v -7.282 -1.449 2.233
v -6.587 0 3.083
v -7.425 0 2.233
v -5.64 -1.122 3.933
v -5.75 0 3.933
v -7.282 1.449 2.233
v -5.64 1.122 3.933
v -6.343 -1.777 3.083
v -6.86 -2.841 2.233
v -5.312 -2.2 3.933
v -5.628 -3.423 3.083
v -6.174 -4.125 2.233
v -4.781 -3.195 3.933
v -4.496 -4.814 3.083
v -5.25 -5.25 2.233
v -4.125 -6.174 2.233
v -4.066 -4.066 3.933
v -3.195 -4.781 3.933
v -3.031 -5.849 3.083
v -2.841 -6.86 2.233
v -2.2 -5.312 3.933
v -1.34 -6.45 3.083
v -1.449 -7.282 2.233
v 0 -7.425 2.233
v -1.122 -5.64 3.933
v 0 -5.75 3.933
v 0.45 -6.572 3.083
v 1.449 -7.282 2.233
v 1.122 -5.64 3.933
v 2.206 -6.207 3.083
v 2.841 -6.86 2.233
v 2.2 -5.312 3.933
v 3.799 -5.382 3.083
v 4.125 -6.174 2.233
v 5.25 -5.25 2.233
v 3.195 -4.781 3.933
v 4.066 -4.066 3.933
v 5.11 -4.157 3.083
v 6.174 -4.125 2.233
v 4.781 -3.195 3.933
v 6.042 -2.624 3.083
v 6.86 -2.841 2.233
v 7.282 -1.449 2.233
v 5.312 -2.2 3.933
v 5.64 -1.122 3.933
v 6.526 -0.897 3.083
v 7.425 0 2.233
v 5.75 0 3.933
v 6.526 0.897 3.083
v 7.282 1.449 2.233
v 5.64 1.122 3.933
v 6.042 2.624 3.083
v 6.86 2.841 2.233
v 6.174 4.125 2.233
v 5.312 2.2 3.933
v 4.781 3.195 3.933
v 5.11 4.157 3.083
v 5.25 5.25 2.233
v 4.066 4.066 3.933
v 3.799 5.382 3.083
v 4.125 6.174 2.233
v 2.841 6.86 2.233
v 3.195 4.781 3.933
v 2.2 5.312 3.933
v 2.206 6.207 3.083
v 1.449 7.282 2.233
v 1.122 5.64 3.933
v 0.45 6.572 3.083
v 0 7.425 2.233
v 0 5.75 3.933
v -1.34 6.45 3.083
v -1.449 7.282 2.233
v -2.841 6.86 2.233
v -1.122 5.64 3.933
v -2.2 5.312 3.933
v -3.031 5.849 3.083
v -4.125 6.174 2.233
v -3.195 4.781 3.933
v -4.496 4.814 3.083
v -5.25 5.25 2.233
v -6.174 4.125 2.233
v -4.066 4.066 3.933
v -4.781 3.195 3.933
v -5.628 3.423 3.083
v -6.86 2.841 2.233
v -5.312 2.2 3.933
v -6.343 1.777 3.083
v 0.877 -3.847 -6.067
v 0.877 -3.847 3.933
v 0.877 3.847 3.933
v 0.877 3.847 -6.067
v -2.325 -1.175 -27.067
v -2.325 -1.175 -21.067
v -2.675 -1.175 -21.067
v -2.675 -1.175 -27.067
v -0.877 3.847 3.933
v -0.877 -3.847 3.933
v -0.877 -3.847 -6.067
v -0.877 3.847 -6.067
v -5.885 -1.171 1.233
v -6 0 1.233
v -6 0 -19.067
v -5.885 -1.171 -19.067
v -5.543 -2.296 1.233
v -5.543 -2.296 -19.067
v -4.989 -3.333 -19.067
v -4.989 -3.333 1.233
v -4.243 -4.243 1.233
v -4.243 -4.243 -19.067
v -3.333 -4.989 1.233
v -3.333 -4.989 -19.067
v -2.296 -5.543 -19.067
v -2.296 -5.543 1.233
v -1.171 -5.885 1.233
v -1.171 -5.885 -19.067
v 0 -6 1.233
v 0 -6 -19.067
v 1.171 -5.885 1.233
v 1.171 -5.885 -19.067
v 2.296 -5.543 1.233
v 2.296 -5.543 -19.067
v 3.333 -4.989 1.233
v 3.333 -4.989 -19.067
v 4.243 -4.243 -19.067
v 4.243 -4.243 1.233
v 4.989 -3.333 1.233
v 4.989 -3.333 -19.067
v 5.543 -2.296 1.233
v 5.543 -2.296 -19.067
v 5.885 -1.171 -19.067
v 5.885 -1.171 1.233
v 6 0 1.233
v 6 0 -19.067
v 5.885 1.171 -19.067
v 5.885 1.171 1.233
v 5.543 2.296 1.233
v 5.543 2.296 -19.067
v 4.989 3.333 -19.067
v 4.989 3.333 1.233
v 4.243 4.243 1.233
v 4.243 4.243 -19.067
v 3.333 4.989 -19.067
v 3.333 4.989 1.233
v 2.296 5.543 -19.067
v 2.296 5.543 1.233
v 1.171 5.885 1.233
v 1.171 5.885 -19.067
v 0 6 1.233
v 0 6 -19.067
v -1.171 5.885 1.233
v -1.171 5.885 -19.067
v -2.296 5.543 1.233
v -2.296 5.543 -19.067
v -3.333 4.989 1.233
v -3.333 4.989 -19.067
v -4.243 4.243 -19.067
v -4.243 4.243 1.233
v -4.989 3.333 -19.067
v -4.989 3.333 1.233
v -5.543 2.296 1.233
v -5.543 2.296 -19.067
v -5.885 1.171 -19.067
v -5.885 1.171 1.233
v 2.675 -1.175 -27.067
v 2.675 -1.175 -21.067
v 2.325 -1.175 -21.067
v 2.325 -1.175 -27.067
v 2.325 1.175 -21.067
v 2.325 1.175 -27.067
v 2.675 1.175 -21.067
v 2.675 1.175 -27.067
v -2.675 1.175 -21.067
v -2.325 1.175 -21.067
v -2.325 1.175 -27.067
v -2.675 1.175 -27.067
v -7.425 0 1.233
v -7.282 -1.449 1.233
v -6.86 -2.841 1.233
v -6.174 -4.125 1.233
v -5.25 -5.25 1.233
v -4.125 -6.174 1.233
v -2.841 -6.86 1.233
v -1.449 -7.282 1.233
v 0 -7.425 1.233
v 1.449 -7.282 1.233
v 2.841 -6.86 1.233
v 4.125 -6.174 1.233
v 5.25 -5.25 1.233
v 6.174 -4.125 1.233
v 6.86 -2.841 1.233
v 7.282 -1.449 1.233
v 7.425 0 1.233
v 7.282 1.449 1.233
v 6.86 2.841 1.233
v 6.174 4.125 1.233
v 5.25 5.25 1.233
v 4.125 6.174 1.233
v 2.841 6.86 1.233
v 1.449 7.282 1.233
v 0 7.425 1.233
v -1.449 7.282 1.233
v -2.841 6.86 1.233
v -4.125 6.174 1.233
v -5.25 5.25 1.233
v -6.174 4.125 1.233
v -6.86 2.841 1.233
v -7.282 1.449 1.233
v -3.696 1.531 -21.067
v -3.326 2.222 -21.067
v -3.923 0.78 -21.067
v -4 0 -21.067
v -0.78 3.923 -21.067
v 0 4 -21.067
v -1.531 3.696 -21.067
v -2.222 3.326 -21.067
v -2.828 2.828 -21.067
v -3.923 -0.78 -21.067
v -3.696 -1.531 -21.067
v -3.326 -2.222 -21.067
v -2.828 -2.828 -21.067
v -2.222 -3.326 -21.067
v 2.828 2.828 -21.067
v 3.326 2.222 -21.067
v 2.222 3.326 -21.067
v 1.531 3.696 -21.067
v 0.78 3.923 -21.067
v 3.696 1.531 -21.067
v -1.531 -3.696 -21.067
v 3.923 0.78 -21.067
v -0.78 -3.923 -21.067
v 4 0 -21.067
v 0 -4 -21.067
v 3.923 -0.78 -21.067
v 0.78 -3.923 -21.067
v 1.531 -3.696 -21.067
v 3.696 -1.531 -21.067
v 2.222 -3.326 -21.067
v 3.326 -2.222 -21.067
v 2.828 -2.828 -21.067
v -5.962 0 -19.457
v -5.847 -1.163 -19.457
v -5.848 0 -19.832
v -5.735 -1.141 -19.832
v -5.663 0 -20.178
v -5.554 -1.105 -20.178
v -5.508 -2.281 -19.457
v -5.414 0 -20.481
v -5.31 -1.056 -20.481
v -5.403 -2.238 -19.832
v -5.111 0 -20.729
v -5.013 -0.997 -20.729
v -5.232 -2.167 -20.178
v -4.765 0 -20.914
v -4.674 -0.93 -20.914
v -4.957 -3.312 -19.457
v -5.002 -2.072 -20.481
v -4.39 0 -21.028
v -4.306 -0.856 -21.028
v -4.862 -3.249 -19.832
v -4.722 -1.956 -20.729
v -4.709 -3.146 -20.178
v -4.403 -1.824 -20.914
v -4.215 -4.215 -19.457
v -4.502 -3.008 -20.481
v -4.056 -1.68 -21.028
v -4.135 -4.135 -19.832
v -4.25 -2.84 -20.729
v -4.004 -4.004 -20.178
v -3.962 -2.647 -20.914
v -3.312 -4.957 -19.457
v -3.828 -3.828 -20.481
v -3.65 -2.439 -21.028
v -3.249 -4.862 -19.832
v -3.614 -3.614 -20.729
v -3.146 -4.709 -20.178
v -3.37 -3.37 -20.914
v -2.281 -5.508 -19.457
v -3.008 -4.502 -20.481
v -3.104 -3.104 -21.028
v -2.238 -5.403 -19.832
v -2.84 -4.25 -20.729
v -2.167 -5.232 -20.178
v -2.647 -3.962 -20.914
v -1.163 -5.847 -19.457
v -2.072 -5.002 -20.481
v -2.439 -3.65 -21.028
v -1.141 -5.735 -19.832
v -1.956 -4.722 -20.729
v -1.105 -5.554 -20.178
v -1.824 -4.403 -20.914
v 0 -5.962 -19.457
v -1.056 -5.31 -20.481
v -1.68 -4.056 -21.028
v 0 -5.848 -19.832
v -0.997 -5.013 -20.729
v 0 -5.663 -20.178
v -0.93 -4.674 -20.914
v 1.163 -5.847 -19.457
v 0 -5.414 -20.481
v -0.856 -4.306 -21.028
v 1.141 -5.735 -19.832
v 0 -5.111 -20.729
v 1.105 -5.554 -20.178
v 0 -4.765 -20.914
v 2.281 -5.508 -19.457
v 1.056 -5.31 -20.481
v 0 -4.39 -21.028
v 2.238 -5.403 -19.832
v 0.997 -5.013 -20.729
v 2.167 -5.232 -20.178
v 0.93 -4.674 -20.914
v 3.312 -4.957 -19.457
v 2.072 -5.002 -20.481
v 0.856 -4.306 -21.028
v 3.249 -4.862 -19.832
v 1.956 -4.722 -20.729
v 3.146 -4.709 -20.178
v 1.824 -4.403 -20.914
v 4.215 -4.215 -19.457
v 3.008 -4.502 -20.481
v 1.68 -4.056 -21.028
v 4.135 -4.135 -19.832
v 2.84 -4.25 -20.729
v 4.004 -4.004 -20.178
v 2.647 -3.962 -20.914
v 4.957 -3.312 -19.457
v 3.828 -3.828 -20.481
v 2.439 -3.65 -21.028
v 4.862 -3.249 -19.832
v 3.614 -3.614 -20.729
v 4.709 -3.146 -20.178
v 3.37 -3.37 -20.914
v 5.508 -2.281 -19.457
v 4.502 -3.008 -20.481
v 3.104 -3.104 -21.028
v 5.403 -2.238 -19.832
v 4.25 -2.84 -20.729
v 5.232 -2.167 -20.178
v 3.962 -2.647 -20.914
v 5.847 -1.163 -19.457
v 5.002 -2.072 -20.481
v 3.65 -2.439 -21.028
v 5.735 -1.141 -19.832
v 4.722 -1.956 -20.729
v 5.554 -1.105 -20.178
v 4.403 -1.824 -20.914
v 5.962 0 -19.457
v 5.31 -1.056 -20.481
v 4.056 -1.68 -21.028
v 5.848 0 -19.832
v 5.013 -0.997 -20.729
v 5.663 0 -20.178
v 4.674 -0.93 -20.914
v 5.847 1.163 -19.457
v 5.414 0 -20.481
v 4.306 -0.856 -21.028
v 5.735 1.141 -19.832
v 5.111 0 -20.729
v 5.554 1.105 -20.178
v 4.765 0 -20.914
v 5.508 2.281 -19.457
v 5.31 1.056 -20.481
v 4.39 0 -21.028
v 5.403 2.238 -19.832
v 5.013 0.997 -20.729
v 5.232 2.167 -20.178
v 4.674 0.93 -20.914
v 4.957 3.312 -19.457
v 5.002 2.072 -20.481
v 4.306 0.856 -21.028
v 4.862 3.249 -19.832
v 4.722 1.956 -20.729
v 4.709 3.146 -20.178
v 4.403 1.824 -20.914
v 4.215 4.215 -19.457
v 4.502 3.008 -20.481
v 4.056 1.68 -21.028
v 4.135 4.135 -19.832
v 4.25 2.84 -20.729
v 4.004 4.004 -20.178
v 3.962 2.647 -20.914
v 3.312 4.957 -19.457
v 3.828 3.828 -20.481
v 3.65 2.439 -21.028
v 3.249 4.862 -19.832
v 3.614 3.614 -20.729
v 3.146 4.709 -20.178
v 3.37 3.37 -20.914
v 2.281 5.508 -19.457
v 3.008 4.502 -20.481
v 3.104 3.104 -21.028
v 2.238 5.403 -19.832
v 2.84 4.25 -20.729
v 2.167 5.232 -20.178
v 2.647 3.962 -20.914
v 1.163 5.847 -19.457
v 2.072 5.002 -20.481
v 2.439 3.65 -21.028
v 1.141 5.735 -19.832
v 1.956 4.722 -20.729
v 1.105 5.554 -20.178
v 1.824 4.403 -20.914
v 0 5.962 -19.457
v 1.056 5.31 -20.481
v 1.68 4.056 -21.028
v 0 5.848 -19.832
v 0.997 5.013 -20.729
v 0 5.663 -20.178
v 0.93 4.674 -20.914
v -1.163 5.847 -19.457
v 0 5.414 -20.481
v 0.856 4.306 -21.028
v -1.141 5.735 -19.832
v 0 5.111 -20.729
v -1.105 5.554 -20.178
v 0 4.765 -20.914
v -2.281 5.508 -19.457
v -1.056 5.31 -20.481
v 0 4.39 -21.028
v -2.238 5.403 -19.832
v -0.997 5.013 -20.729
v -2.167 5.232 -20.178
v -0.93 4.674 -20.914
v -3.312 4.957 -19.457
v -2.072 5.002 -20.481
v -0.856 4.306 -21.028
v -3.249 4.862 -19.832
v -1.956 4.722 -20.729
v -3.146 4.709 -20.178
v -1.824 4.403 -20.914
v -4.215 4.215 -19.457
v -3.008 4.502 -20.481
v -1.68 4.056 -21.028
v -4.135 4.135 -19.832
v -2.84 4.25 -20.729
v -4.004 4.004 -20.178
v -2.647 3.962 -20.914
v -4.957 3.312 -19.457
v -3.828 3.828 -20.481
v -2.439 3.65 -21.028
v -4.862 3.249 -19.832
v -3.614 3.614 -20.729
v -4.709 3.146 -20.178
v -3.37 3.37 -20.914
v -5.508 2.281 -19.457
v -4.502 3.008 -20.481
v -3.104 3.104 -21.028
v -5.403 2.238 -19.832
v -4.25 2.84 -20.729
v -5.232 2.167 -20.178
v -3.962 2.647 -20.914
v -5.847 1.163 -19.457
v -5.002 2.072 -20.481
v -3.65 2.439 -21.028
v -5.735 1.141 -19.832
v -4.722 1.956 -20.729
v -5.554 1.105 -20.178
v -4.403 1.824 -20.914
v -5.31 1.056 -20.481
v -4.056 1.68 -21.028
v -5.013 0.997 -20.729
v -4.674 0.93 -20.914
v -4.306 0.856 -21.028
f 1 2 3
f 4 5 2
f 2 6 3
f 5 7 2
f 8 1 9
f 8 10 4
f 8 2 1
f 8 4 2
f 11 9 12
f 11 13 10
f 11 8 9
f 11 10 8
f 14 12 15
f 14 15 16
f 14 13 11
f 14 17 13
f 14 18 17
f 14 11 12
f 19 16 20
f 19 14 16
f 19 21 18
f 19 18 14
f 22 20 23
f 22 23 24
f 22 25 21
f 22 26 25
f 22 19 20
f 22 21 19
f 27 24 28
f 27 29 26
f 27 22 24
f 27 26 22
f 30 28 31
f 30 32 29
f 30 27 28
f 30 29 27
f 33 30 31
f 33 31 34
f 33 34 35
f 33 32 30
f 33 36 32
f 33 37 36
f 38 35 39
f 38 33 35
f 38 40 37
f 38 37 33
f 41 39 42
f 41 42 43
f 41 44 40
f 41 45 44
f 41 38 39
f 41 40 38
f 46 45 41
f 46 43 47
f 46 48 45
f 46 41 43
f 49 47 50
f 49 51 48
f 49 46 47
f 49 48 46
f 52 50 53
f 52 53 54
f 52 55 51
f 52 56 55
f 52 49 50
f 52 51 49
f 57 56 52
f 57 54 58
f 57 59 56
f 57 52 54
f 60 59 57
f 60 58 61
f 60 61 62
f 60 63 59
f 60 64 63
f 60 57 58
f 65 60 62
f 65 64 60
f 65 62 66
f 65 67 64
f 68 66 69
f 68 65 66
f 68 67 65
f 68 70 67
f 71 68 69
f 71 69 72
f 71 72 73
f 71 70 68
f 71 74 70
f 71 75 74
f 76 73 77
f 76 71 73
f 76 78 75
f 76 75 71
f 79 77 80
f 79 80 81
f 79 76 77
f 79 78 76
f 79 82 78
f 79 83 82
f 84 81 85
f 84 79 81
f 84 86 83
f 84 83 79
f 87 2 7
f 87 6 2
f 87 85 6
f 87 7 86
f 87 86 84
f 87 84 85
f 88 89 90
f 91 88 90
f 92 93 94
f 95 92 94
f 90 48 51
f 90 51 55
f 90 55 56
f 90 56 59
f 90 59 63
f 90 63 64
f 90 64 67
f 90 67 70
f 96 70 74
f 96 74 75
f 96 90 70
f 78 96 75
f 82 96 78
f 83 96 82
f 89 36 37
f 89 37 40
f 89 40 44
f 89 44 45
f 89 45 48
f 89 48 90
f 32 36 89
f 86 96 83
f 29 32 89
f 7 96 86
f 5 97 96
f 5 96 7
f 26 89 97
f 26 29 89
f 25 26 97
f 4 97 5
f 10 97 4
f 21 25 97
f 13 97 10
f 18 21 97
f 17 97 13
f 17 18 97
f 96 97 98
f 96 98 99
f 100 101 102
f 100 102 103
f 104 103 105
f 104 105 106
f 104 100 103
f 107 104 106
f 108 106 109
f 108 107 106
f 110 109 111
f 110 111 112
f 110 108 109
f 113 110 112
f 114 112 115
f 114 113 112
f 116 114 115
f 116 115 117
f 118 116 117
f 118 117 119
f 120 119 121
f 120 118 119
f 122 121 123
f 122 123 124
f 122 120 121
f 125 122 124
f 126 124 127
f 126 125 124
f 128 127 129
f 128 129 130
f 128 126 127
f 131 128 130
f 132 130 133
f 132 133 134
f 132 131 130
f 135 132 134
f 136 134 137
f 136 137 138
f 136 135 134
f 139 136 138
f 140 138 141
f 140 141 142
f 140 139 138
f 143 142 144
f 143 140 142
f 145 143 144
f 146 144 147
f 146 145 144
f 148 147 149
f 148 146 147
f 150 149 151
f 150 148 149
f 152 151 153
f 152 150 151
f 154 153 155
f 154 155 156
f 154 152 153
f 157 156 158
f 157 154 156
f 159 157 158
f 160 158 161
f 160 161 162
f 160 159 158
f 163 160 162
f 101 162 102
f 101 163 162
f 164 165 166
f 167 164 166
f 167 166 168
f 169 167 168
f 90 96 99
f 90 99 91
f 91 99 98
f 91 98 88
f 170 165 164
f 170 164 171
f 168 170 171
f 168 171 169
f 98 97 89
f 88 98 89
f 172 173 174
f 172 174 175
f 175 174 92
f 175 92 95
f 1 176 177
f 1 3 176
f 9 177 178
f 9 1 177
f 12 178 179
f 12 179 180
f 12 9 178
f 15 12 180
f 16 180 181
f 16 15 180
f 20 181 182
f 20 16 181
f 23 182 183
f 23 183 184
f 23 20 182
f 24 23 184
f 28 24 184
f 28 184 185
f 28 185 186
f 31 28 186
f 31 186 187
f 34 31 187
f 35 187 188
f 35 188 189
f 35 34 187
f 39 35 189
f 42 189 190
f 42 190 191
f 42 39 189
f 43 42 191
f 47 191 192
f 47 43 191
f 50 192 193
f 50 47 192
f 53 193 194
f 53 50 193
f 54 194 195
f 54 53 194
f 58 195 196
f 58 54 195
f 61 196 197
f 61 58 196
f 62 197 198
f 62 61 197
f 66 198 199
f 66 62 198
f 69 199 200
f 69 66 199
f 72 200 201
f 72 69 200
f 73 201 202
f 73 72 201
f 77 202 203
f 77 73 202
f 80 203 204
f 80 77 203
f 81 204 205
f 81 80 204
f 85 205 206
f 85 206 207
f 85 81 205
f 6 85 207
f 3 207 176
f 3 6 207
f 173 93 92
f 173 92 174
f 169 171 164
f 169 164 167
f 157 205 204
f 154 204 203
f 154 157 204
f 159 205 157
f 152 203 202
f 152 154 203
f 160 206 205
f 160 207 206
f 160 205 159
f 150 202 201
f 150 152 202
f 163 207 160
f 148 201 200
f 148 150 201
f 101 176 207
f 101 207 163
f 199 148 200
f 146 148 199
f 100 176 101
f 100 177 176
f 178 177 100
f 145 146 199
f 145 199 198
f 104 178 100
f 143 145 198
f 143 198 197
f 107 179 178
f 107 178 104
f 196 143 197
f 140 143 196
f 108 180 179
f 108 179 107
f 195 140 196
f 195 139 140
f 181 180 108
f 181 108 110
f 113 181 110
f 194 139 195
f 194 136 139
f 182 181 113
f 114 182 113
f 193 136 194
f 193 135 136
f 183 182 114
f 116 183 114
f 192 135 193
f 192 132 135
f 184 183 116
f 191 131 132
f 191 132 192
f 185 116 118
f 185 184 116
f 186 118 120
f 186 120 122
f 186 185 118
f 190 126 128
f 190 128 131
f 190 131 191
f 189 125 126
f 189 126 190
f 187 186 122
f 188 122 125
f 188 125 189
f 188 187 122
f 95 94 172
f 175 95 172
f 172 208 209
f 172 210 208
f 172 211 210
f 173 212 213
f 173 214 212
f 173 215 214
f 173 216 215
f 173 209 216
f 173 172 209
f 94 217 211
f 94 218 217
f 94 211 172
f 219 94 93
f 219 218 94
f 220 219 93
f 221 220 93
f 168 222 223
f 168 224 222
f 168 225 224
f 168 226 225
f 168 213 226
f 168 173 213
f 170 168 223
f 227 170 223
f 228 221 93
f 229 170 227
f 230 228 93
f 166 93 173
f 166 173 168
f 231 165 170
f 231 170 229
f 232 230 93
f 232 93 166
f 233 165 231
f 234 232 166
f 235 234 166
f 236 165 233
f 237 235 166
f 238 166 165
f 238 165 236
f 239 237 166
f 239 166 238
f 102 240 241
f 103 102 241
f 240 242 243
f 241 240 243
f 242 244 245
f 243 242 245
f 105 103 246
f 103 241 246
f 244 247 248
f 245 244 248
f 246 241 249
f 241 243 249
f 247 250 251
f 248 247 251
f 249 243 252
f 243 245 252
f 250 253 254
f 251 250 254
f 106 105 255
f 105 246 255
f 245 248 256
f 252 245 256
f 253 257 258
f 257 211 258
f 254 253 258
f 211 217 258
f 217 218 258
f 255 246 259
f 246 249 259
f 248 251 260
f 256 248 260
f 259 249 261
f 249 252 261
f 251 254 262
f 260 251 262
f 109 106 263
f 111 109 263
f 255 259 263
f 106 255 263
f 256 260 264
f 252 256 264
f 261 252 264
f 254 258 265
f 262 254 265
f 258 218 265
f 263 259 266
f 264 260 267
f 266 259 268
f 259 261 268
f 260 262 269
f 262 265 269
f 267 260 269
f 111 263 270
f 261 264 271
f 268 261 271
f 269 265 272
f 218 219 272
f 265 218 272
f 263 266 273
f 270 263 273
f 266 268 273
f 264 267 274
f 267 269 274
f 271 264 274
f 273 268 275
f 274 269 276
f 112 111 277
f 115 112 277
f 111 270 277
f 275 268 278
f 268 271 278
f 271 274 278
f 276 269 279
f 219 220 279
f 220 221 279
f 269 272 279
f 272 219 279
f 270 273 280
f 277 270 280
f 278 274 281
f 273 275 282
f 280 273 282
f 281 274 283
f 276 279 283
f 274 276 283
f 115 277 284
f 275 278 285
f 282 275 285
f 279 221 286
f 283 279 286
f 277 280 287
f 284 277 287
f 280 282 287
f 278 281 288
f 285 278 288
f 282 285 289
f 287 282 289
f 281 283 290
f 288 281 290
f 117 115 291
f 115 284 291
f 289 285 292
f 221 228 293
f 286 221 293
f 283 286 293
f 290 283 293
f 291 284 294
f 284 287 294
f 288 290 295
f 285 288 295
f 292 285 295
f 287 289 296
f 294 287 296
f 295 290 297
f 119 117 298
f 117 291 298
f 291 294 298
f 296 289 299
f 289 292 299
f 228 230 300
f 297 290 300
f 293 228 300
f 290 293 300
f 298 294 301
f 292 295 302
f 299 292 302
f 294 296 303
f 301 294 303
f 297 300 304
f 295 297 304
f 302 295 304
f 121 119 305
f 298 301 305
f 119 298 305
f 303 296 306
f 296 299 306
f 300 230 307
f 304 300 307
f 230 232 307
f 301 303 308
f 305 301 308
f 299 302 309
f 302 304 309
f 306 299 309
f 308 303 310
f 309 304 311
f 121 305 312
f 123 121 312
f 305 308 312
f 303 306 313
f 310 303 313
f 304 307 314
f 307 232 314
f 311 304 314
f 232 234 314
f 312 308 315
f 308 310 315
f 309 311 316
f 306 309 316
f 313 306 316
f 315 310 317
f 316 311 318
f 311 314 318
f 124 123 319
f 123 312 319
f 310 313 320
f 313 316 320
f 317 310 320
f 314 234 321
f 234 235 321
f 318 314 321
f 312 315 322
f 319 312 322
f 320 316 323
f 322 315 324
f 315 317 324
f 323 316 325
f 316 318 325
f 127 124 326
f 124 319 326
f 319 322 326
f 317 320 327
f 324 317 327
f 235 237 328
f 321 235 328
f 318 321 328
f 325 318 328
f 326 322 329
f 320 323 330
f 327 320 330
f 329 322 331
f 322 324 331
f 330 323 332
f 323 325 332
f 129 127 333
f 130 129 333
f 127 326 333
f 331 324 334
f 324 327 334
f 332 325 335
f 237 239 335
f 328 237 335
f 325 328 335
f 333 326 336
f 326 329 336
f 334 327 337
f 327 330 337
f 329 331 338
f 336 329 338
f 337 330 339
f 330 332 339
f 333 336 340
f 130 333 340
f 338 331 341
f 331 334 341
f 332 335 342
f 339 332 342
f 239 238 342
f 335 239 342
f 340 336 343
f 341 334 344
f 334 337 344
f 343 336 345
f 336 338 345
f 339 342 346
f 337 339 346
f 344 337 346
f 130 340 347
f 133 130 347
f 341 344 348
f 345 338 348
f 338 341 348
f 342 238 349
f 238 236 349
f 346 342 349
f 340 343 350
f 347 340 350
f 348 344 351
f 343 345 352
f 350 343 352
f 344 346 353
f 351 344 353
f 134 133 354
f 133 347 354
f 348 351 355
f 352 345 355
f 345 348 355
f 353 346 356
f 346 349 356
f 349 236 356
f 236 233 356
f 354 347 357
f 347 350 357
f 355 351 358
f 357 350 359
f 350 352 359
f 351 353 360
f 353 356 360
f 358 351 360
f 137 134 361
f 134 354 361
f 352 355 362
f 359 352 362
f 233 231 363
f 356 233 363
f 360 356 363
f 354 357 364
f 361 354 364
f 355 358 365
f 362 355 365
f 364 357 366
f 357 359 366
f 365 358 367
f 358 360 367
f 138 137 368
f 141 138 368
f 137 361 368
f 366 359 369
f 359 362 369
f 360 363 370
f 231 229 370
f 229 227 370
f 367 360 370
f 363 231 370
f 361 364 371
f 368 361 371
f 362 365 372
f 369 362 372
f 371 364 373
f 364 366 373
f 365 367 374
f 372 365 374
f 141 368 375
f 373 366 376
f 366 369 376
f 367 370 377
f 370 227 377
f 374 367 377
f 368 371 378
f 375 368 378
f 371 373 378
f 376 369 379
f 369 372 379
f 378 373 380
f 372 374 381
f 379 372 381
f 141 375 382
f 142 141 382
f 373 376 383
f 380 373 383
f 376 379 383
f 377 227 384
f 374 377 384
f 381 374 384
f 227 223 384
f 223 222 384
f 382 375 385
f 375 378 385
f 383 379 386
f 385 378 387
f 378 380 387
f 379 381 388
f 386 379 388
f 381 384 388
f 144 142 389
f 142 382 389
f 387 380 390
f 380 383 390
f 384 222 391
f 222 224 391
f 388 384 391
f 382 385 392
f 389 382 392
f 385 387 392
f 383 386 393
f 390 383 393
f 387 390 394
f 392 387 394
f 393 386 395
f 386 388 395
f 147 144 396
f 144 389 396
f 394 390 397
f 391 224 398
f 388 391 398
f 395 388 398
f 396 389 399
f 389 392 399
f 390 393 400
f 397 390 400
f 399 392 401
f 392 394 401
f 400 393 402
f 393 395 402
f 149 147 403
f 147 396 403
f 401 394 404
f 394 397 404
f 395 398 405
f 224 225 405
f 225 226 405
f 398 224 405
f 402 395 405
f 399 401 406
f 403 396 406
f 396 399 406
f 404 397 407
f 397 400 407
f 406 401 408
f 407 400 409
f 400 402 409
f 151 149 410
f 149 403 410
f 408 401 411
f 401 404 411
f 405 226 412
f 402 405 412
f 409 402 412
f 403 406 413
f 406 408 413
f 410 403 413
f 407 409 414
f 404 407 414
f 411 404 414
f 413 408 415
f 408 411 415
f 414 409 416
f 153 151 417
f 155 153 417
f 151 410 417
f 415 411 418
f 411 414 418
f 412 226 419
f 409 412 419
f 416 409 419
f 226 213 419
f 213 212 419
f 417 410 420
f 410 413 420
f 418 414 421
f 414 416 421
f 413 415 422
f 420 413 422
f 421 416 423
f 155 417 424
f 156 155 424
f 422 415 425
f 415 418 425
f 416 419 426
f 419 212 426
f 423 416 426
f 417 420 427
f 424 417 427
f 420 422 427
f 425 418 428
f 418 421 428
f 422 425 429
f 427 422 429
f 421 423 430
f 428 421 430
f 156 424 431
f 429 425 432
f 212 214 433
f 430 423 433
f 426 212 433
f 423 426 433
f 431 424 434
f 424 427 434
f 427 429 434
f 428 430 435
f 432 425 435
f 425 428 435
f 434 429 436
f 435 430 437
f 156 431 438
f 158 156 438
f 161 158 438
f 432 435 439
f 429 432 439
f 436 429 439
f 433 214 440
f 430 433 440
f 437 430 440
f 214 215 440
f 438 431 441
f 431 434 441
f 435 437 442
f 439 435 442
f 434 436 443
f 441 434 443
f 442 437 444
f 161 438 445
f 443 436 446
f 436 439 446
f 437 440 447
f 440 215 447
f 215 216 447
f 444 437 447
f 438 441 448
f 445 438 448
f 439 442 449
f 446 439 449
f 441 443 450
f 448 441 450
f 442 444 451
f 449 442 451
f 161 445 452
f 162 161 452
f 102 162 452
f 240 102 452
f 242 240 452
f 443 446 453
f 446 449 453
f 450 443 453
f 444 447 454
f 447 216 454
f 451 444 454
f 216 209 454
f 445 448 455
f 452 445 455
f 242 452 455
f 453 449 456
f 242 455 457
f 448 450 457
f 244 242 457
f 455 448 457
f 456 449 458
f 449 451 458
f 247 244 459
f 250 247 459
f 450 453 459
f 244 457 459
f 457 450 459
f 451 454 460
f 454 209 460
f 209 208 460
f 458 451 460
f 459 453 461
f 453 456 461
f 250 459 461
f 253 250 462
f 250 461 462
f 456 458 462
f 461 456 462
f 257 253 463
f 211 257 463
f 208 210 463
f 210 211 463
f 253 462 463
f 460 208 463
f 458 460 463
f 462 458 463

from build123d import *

# Parameters (mm, degrees)
SKETCH2_W           = 1.754577672
SKETCH2_H           = 7.693148258
CUT_EXTRUDE1_DEPTH  = 10
SKETCH3_W           = 0.35
SKETCH3_H           = 2.35
BOSS_EXTRUDE1_DEPTH = 6
FILLET1_R           = 2


with BuildPart() as part:
    # Sketch1 → Revolve1 (revolve)
    with BuildSketch(Plane(origin=(0, 0, 0), x_dir=(1, 0, 0), z_dir=(0, 1, 0))):
        Polygon((-7.425, -2.233468586), (-5.75, -3.933468586), (0, -3.933468586), (0, 0), (0, 21.066531414), (-6, 21.066531414), (-6, -1.233468586), (-7.425, -1.233468586), align=None)
    revolve(axis=Axis((0, 0, -16.306049865), (0, 0, 1)))

    # Sketch2 → Cut-Extrude1 (cut)
    with BuildSketch(Plane.XY.offset(3.933468586)):
        Rectangle(SKETCH2_W, SKETCH2_H)
    extrude(amount=-CUT_EXTRUDE1_DEPTH, mode=Mode.SUBTRACT)

    # Sketch3 → Boss-Extrude1 (add)
    with BuildSketch(Plane(origin=(0, 0, -21.066531414), x_dir=(-1, 0, 0), z_dir=(0, 0, -1))):
        with Locations((-2.5, 0)):
            Rectangle(SKETCH3_W, SKETCH3_H)
        with Locations((2.5, 0)):
            Rectangle(SKETCH3_W, SKETCH3_H)
    extrude(amount=BOSS_EXTRUDE1_DEPTH)

    # Fillet1
    fillet1_edges = [part.edges().sort_by_distance(p)[0] for p in [
        (6, 0, -21.066531414),
    ]]
    fillet(fillet1_edges, radius=FILLET1_R)


solid = part.part
